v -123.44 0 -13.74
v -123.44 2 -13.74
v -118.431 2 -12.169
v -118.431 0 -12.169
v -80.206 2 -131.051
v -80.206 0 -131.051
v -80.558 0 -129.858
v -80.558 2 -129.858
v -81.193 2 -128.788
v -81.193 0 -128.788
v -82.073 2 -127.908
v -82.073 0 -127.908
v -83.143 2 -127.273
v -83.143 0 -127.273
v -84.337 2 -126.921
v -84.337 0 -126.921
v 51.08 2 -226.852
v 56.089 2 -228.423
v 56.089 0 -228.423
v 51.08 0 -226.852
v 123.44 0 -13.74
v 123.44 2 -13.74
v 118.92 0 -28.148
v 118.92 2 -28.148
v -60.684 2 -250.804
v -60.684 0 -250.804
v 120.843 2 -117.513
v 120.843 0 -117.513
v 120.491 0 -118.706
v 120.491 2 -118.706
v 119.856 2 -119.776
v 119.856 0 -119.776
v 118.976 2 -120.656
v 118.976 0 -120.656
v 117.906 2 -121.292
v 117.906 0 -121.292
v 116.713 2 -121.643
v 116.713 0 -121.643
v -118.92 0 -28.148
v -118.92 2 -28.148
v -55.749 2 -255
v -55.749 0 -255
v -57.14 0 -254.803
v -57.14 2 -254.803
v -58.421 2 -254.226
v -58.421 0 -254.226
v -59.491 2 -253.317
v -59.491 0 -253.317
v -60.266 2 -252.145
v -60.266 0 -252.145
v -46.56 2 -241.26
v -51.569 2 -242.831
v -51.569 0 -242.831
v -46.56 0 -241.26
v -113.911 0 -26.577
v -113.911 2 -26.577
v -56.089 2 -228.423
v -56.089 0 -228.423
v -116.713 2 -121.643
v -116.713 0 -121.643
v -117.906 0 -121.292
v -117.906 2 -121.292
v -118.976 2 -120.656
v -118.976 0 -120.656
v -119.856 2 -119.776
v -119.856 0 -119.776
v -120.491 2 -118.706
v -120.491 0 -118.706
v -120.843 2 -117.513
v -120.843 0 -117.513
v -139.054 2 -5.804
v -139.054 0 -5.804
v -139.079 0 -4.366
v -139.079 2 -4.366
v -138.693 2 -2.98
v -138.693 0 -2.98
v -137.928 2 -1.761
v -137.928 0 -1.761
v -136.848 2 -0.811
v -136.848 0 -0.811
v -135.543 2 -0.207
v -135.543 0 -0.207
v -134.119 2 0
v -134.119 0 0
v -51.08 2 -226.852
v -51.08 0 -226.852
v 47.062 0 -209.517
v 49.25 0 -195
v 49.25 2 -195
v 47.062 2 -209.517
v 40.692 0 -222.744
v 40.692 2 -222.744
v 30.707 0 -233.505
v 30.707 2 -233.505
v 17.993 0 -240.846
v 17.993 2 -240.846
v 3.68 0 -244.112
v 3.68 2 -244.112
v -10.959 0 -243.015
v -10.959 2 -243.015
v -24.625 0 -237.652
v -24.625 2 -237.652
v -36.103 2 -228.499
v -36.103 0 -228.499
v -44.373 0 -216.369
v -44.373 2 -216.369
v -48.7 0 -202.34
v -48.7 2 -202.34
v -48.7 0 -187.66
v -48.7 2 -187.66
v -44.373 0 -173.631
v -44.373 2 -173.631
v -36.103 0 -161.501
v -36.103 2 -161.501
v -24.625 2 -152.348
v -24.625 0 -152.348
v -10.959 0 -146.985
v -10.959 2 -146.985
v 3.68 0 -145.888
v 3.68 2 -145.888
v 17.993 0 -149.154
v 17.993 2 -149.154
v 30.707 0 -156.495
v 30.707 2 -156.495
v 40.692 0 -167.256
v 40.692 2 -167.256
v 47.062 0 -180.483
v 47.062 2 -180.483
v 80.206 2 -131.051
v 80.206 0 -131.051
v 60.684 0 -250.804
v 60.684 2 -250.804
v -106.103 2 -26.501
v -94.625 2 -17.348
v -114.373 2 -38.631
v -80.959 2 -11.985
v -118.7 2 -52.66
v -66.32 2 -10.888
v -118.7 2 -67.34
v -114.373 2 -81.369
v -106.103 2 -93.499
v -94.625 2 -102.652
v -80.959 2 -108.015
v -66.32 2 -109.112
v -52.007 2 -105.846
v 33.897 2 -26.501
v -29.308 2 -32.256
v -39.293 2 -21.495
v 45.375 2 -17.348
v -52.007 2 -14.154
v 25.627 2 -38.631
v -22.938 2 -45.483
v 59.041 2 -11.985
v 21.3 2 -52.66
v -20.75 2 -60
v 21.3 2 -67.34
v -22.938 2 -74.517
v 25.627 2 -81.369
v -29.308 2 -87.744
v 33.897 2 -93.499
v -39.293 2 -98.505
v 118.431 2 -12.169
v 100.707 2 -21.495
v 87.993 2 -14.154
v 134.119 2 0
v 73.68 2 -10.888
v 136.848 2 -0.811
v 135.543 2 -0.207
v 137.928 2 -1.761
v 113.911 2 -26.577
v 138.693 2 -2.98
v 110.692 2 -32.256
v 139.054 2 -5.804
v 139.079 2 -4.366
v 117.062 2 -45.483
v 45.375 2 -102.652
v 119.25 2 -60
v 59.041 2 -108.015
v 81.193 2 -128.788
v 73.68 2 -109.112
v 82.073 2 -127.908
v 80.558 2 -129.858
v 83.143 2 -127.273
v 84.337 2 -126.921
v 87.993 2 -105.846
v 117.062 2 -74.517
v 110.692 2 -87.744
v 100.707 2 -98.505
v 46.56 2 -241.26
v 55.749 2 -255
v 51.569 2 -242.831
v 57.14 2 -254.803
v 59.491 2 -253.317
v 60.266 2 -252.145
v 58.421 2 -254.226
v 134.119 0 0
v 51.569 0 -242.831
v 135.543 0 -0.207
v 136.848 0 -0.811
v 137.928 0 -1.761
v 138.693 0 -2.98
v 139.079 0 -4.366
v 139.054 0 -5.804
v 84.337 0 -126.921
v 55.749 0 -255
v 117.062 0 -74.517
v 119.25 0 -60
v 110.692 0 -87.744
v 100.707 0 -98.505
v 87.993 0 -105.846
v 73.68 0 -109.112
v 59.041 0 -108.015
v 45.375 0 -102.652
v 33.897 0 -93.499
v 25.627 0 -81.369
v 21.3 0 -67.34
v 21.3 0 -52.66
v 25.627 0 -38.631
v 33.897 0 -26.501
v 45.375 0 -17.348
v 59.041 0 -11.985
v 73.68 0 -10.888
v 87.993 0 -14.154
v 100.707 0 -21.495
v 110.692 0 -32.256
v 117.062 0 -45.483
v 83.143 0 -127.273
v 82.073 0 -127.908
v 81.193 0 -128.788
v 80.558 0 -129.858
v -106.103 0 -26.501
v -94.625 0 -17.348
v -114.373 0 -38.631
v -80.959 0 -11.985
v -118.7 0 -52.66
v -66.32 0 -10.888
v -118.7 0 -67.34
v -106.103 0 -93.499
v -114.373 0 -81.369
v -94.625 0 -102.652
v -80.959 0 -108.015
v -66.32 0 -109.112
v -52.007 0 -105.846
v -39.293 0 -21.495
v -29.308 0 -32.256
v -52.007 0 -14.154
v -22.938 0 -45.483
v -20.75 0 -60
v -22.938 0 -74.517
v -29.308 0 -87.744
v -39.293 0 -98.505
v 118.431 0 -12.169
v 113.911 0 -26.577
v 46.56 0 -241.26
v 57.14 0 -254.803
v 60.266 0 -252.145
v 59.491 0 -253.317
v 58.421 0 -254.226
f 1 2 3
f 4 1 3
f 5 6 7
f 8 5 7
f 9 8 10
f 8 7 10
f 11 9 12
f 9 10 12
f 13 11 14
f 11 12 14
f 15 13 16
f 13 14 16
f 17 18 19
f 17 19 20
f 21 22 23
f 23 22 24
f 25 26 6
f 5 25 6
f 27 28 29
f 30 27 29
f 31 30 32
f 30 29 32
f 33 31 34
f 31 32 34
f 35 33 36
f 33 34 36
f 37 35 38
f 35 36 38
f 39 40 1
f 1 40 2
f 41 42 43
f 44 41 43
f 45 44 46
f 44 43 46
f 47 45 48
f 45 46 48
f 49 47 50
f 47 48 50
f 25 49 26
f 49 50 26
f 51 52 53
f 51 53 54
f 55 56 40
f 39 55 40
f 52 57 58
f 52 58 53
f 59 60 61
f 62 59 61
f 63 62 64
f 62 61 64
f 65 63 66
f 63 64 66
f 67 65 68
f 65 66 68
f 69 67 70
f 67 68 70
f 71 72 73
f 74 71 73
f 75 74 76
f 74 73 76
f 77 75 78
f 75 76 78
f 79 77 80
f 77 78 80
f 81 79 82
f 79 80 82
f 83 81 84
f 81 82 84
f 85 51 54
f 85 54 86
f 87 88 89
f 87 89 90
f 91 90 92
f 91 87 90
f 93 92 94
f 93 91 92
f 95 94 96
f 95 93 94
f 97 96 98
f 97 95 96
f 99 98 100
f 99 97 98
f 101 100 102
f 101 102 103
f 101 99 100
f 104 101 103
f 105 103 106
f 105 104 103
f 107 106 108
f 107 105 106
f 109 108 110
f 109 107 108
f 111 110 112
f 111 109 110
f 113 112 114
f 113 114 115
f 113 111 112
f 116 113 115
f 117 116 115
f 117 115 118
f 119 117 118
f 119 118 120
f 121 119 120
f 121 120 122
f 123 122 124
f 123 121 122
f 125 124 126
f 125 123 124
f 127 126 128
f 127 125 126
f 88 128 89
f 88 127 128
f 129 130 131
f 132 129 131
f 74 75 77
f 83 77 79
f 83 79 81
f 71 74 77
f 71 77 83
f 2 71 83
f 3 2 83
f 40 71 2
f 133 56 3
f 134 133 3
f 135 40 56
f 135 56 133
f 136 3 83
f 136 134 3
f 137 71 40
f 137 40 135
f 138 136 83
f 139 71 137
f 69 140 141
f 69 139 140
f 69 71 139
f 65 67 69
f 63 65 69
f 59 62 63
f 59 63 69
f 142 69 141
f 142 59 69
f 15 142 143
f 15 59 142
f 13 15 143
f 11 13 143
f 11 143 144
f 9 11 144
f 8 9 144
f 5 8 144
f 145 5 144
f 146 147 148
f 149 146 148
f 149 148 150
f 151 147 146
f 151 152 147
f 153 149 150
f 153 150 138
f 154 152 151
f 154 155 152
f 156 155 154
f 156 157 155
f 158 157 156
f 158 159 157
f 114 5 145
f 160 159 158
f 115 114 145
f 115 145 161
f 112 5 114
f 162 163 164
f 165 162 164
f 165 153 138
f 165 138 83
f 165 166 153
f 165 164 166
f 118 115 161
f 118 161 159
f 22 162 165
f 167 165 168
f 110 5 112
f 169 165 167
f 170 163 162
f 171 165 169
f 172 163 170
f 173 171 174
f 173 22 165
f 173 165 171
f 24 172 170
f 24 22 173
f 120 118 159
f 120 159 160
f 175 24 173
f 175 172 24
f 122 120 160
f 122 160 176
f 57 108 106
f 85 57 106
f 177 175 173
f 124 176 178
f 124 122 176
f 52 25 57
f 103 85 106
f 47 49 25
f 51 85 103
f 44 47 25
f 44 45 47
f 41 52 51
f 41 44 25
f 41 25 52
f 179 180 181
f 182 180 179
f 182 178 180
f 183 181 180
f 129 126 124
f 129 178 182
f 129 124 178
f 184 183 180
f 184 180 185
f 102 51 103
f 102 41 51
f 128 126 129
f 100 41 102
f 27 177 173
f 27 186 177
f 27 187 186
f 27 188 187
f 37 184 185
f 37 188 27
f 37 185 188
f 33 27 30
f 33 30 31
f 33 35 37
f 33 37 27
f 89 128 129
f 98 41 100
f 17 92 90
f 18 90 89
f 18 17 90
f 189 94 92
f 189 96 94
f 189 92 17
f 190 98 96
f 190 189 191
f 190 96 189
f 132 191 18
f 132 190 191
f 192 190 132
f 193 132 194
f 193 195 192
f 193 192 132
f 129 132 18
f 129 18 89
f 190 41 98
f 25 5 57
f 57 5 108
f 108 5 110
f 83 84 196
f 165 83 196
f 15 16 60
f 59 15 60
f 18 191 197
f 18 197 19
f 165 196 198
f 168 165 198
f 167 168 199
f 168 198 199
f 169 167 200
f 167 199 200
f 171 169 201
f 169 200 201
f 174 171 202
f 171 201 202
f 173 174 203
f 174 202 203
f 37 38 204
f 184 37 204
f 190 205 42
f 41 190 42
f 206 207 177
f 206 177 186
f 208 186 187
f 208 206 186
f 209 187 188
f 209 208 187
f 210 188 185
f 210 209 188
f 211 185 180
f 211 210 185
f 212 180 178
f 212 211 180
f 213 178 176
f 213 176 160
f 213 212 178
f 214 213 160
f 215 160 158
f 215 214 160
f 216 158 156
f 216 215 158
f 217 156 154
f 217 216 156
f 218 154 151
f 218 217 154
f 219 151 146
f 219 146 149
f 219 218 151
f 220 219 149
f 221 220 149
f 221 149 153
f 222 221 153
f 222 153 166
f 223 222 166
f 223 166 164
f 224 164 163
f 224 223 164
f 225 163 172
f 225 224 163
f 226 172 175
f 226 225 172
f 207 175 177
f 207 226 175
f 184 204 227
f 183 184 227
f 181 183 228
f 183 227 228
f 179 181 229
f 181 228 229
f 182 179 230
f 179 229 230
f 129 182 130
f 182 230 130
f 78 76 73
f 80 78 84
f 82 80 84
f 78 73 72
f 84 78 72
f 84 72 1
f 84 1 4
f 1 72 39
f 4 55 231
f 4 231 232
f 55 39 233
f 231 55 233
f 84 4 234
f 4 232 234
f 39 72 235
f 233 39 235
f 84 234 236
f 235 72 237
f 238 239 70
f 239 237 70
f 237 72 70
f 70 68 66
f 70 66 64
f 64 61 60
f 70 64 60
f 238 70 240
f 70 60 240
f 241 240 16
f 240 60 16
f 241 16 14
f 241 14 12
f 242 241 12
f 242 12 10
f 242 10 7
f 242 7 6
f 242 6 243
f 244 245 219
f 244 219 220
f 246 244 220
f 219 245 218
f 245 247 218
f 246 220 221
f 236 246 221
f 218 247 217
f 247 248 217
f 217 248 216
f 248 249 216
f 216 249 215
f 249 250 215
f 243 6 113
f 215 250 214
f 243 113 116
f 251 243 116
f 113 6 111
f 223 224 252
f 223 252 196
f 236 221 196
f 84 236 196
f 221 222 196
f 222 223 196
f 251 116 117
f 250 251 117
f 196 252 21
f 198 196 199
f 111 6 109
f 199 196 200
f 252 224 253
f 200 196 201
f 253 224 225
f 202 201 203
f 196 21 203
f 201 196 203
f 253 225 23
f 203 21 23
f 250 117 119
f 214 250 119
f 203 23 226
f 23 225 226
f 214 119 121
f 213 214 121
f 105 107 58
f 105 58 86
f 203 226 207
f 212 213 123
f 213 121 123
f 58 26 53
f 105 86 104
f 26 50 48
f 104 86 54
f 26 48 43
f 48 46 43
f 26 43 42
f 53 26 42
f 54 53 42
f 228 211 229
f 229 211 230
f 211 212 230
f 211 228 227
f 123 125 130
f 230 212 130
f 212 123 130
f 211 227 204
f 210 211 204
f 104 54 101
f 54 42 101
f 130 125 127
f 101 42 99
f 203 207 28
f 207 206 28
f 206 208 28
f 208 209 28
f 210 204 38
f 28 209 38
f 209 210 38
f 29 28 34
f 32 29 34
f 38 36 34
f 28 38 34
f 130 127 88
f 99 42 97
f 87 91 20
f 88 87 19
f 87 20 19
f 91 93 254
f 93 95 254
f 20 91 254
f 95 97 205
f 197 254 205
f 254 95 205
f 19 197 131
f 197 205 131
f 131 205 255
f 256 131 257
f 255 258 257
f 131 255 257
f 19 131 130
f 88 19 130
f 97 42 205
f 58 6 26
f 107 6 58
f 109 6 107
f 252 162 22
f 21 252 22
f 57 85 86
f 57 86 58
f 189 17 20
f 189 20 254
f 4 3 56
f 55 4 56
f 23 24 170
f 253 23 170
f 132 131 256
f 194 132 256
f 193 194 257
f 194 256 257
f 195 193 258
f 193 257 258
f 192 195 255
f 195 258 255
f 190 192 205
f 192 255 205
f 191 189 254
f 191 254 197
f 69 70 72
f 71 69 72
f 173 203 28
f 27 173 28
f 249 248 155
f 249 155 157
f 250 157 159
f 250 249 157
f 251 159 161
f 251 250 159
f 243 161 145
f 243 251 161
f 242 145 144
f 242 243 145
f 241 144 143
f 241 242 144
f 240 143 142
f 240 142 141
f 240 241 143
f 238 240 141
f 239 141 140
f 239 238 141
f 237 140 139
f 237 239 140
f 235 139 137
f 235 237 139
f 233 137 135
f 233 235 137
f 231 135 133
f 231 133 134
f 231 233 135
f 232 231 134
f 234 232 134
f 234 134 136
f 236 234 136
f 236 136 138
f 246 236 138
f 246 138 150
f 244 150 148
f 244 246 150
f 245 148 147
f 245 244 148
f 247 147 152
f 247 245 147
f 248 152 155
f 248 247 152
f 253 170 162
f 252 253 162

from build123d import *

# Parameters (mm, degrees)
SKETCH1_R           = 49.25
BOSS_EXTRUDE1_DEPTH = 2
CUT_EXTRUDE1_DEPTH  = 5


with BuildPart() as part:
    # Sketch1 → Boss-Extrude1 (new body)
    with BuildSketch(Plane(origin=(0, 0, 0), x_dir=(1, 0, 0), z_dir=(0, 1, 0))):
        with BuildLine():
            Line((-134.118891506, 0), (134.118891506, 0))
            ThreePointArc((134.118891506, 0), (137.928249972, 1.76136015), (139.053747558, 5.804484769))
            Line((139.053747558, 5.804484769), (120.84297072, 117.512705691))
            ThreePointArc((120.84297072, 117.512705691), (119.443648574, 120.243754828), (116.712599437, 121.643076974))
            Line((116.712599437, 121.643076974), (84.336583334, 126.921044874))
            ThreePointArc((84.336583334, 126.921044874), (81.605534197, 128.32036702), (80.206212051, 131.051416157))
            Line((80.206212051, 131.051416157), (60.683956749, 250.804484769))
            ThreePointArc((60.683956749, 250.804484769), (58.987740546, 253.809358466), (55.749100697, 255))
            Line((55.749100697, 255), (-55.749100697, 255))
            ThreePointArc((-55.749100697, 255), (-58.987740546, 253.809358466), (-60.683956749, 250.804484769))
            Line((-60.683956749, 250.804484769), (-80.206212051, 131.051416157))
            ThreePointArc((-80.206212051, 131.051416157), (-81.605534197, 128.32036702), (-84.336583334, 126.921044874))
            Line((-84.336583334, 126.921044874), (-116.712599437, 121.643076974))
            ThreePointArc((-116.712599437, 121.643076974), (-119.443648574, 120.243754828), (-120.84297072, 117.512705691))
            Line((-120.84297072, 117.512705691), (-139.053747558, 5.804484769))
            ThreePointArc((-139.053747558, 5.804484769), (-137.928249972, 1.76136015), (-134.118891506, 0))
        make_face()
        with Locations((0, 195)):
            Circle(SKETCH1_R, mode=Mode.SUBTRACT)
        with Locations((-70, 60)):
            Circle(SKETCH1_R, mode=Mode.SUBTRACT)
        with Locations((70, 60)):
            Circle(SKETCH1_R, mode=Mode.SUBTRACT)
    extrude(amount=BOSS_EXTRUDE1_DEPTH)

    # Sketch2 → Cut-Extrude1 (cut)
    with BuildSketch(Plane(origin=(0, 2, 0), x_dir=(1, 0, 0), z_dir=(0, 1, 0))):
        Polygon((-56.088893707, 228.423441568), (-51.568858582, 242.831053531), (-46.559589522, 241.259518139), (-51.079624647, 226.851906177), align=None)
        Polygon((-118.431141418, 12.168946469), (-113.911106293, 26.576558432), (-118.920375353, 28.148093823), (-123.440410478, 13.740481861), align=None)
        Polygon((123.440410478, 13.740481861), (118.920375353, 28.148093823), (113.911106293, 26.576558432), (118.431141418, 12.168946469), align=None)
        Polygon((51.079624647, 226.851906177), (46.559589522, 241.259518139), (51.568858582, 242.831053531), (56.088893707, 228.423441568), align=None)
    extrude(amount=-CUT_EXTRUDE1_DEPTH, mode=Mode.SUBTRACT)


solid = part.part
